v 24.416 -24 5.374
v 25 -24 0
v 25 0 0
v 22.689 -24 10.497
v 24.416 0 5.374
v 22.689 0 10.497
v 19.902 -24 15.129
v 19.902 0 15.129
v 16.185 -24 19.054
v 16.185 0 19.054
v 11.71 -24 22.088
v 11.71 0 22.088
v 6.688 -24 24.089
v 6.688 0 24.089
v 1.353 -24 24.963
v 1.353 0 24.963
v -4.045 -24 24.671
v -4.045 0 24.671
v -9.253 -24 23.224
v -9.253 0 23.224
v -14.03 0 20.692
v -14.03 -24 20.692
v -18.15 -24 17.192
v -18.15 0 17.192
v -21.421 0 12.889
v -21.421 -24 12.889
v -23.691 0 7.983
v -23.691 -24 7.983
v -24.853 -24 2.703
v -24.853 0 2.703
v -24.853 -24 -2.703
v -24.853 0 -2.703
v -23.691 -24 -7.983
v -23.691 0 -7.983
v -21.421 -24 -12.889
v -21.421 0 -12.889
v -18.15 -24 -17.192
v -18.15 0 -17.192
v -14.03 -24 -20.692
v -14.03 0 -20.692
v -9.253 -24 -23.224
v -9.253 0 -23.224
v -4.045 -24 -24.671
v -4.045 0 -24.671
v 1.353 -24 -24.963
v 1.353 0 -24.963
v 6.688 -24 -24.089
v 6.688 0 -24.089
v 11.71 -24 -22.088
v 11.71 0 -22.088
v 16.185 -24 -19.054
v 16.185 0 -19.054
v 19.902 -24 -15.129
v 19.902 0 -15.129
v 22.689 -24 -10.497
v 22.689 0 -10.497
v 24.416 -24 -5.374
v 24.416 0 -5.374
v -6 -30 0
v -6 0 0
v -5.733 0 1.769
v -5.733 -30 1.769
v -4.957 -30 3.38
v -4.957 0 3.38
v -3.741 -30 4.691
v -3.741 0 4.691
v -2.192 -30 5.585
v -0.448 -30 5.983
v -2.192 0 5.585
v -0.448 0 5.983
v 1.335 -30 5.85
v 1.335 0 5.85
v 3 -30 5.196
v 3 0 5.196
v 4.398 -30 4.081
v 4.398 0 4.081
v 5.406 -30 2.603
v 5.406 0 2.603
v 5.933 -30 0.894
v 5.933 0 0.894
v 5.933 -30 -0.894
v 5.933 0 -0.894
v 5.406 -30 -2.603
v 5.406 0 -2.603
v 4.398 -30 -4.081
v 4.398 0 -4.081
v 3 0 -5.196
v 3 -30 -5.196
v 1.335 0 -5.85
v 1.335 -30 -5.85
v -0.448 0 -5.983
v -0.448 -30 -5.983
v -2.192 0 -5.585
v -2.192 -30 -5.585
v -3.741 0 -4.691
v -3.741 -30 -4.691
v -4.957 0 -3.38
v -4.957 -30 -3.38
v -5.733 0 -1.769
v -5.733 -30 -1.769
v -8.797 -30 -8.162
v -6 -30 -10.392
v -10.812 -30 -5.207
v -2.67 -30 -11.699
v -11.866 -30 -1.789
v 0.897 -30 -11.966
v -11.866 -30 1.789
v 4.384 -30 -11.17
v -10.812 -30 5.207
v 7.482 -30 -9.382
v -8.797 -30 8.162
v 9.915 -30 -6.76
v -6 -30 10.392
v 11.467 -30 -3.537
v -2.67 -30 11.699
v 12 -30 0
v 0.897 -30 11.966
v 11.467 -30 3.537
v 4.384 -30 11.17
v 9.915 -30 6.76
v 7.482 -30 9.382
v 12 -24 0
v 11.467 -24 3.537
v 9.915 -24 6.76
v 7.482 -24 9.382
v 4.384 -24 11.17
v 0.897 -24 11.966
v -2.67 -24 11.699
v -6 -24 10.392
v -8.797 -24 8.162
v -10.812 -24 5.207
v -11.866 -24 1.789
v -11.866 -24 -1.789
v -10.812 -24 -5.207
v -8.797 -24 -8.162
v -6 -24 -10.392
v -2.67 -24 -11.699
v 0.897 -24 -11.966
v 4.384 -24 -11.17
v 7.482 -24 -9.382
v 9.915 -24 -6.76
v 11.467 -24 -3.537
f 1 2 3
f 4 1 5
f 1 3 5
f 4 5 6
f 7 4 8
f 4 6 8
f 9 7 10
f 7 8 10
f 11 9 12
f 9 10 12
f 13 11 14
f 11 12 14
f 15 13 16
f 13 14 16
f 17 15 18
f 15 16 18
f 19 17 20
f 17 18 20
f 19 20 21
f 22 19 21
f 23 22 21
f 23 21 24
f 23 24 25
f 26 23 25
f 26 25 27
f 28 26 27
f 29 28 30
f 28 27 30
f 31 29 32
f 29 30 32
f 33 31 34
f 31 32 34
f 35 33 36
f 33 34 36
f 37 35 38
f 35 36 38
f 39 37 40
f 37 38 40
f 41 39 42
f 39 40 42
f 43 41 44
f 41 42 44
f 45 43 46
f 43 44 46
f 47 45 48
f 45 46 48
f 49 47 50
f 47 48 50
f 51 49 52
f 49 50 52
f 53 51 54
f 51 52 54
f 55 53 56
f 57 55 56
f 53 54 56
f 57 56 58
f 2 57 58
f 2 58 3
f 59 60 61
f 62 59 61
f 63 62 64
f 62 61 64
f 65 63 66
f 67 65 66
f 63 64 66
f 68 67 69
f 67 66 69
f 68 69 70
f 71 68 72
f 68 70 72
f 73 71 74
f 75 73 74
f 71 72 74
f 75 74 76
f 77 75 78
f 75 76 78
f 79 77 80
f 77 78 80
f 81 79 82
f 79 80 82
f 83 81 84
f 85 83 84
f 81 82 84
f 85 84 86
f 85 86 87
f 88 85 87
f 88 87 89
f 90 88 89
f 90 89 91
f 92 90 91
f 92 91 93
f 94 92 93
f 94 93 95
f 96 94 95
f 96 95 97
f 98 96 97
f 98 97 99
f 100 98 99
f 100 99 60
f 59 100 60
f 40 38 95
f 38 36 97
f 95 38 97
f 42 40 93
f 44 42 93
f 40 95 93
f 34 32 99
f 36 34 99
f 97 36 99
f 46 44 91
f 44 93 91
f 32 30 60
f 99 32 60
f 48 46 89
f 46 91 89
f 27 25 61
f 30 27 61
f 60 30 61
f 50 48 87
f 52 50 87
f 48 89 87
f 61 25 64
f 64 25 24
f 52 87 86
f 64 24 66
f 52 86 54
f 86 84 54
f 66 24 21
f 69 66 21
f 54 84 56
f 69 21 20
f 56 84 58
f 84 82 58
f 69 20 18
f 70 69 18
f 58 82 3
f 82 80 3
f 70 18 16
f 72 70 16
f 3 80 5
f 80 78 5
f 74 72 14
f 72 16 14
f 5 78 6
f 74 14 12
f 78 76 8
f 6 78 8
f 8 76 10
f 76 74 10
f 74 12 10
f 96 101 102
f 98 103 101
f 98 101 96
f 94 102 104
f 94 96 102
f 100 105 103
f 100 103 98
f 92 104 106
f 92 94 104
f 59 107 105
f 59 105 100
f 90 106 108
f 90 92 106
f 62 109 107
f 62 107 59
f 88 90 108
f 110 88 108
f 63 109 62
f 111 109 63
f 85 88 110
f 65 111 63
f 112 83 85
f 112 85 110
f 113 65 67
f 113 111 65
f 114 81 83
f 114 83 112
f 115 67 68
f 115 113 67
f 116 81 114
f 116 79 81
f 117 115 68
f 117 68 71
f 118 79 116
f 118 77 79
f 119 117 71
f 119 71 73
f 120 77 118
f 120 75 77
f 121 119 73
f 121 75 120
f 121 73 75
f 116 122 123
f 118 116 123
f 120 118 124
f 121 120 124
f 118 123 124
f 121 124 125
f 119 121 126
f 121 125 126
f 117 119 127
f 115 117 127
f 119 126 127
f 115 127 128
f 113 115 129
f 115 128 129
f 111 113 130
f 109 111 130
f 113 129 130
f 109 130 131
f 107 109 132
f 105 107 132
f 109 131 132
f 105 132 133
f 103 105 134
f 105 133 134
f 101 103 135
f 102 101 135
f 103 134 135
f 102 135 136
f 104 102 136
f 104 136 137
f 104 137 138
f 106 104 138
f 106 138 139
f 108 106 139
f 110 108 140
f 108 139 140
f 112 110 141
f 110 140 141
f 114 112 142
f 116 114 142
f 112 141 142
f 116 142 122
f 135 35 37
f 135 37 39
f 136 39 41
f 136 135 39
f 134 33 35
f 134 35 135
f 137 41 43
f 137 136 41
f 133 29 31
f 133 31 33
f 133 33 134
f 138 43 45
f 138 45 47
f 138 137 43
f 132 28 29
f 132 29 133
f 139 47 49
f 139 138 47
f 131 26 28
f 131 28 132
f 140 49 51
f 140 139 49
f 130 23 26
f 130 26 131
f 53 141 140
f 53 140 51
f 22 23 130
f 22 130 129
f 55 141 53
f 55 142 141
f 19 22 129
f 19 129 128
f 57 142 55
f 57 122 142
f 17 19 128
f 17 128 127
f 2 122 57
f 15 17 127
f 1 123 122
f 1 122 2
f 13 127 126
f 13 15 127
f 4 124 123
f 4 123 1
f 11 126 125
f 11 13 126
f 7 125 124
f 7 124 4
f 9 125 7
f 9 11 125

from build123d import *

# Parameters (mm, degrees)
F0_R     = 25
F1_DEPTH = 24
F2_R     = 12
F3_DEPTH = 6
F4_R     = 6
F5_DEPTH = 30.001


with BuildPart() as f1:
    # F0 (on Front) → F1 (new body)
    with BuildSketch(Plane.XZ):
        Circle(F0_R)
    extrude(amount=F1_DEPTH)

    # F2 (on face) → F3 (join)
    with BuildSketch(Plane.XZ.offset(24)):
        Circle(F2_R)
    extrude(amount=F3_DEPTH)

    # F4 (on face) → F5 (cut, through all)
    with BuildSketch(Plane(origin=(0, 0, 0), x_dir=(-1, 0, 0), z_dir=(0, 1, 0))):
        Circle(F4_R)
    extrude(amount=-F5_DEPTH, mode=Mode.SUBTRACT)


solid = f1.part
